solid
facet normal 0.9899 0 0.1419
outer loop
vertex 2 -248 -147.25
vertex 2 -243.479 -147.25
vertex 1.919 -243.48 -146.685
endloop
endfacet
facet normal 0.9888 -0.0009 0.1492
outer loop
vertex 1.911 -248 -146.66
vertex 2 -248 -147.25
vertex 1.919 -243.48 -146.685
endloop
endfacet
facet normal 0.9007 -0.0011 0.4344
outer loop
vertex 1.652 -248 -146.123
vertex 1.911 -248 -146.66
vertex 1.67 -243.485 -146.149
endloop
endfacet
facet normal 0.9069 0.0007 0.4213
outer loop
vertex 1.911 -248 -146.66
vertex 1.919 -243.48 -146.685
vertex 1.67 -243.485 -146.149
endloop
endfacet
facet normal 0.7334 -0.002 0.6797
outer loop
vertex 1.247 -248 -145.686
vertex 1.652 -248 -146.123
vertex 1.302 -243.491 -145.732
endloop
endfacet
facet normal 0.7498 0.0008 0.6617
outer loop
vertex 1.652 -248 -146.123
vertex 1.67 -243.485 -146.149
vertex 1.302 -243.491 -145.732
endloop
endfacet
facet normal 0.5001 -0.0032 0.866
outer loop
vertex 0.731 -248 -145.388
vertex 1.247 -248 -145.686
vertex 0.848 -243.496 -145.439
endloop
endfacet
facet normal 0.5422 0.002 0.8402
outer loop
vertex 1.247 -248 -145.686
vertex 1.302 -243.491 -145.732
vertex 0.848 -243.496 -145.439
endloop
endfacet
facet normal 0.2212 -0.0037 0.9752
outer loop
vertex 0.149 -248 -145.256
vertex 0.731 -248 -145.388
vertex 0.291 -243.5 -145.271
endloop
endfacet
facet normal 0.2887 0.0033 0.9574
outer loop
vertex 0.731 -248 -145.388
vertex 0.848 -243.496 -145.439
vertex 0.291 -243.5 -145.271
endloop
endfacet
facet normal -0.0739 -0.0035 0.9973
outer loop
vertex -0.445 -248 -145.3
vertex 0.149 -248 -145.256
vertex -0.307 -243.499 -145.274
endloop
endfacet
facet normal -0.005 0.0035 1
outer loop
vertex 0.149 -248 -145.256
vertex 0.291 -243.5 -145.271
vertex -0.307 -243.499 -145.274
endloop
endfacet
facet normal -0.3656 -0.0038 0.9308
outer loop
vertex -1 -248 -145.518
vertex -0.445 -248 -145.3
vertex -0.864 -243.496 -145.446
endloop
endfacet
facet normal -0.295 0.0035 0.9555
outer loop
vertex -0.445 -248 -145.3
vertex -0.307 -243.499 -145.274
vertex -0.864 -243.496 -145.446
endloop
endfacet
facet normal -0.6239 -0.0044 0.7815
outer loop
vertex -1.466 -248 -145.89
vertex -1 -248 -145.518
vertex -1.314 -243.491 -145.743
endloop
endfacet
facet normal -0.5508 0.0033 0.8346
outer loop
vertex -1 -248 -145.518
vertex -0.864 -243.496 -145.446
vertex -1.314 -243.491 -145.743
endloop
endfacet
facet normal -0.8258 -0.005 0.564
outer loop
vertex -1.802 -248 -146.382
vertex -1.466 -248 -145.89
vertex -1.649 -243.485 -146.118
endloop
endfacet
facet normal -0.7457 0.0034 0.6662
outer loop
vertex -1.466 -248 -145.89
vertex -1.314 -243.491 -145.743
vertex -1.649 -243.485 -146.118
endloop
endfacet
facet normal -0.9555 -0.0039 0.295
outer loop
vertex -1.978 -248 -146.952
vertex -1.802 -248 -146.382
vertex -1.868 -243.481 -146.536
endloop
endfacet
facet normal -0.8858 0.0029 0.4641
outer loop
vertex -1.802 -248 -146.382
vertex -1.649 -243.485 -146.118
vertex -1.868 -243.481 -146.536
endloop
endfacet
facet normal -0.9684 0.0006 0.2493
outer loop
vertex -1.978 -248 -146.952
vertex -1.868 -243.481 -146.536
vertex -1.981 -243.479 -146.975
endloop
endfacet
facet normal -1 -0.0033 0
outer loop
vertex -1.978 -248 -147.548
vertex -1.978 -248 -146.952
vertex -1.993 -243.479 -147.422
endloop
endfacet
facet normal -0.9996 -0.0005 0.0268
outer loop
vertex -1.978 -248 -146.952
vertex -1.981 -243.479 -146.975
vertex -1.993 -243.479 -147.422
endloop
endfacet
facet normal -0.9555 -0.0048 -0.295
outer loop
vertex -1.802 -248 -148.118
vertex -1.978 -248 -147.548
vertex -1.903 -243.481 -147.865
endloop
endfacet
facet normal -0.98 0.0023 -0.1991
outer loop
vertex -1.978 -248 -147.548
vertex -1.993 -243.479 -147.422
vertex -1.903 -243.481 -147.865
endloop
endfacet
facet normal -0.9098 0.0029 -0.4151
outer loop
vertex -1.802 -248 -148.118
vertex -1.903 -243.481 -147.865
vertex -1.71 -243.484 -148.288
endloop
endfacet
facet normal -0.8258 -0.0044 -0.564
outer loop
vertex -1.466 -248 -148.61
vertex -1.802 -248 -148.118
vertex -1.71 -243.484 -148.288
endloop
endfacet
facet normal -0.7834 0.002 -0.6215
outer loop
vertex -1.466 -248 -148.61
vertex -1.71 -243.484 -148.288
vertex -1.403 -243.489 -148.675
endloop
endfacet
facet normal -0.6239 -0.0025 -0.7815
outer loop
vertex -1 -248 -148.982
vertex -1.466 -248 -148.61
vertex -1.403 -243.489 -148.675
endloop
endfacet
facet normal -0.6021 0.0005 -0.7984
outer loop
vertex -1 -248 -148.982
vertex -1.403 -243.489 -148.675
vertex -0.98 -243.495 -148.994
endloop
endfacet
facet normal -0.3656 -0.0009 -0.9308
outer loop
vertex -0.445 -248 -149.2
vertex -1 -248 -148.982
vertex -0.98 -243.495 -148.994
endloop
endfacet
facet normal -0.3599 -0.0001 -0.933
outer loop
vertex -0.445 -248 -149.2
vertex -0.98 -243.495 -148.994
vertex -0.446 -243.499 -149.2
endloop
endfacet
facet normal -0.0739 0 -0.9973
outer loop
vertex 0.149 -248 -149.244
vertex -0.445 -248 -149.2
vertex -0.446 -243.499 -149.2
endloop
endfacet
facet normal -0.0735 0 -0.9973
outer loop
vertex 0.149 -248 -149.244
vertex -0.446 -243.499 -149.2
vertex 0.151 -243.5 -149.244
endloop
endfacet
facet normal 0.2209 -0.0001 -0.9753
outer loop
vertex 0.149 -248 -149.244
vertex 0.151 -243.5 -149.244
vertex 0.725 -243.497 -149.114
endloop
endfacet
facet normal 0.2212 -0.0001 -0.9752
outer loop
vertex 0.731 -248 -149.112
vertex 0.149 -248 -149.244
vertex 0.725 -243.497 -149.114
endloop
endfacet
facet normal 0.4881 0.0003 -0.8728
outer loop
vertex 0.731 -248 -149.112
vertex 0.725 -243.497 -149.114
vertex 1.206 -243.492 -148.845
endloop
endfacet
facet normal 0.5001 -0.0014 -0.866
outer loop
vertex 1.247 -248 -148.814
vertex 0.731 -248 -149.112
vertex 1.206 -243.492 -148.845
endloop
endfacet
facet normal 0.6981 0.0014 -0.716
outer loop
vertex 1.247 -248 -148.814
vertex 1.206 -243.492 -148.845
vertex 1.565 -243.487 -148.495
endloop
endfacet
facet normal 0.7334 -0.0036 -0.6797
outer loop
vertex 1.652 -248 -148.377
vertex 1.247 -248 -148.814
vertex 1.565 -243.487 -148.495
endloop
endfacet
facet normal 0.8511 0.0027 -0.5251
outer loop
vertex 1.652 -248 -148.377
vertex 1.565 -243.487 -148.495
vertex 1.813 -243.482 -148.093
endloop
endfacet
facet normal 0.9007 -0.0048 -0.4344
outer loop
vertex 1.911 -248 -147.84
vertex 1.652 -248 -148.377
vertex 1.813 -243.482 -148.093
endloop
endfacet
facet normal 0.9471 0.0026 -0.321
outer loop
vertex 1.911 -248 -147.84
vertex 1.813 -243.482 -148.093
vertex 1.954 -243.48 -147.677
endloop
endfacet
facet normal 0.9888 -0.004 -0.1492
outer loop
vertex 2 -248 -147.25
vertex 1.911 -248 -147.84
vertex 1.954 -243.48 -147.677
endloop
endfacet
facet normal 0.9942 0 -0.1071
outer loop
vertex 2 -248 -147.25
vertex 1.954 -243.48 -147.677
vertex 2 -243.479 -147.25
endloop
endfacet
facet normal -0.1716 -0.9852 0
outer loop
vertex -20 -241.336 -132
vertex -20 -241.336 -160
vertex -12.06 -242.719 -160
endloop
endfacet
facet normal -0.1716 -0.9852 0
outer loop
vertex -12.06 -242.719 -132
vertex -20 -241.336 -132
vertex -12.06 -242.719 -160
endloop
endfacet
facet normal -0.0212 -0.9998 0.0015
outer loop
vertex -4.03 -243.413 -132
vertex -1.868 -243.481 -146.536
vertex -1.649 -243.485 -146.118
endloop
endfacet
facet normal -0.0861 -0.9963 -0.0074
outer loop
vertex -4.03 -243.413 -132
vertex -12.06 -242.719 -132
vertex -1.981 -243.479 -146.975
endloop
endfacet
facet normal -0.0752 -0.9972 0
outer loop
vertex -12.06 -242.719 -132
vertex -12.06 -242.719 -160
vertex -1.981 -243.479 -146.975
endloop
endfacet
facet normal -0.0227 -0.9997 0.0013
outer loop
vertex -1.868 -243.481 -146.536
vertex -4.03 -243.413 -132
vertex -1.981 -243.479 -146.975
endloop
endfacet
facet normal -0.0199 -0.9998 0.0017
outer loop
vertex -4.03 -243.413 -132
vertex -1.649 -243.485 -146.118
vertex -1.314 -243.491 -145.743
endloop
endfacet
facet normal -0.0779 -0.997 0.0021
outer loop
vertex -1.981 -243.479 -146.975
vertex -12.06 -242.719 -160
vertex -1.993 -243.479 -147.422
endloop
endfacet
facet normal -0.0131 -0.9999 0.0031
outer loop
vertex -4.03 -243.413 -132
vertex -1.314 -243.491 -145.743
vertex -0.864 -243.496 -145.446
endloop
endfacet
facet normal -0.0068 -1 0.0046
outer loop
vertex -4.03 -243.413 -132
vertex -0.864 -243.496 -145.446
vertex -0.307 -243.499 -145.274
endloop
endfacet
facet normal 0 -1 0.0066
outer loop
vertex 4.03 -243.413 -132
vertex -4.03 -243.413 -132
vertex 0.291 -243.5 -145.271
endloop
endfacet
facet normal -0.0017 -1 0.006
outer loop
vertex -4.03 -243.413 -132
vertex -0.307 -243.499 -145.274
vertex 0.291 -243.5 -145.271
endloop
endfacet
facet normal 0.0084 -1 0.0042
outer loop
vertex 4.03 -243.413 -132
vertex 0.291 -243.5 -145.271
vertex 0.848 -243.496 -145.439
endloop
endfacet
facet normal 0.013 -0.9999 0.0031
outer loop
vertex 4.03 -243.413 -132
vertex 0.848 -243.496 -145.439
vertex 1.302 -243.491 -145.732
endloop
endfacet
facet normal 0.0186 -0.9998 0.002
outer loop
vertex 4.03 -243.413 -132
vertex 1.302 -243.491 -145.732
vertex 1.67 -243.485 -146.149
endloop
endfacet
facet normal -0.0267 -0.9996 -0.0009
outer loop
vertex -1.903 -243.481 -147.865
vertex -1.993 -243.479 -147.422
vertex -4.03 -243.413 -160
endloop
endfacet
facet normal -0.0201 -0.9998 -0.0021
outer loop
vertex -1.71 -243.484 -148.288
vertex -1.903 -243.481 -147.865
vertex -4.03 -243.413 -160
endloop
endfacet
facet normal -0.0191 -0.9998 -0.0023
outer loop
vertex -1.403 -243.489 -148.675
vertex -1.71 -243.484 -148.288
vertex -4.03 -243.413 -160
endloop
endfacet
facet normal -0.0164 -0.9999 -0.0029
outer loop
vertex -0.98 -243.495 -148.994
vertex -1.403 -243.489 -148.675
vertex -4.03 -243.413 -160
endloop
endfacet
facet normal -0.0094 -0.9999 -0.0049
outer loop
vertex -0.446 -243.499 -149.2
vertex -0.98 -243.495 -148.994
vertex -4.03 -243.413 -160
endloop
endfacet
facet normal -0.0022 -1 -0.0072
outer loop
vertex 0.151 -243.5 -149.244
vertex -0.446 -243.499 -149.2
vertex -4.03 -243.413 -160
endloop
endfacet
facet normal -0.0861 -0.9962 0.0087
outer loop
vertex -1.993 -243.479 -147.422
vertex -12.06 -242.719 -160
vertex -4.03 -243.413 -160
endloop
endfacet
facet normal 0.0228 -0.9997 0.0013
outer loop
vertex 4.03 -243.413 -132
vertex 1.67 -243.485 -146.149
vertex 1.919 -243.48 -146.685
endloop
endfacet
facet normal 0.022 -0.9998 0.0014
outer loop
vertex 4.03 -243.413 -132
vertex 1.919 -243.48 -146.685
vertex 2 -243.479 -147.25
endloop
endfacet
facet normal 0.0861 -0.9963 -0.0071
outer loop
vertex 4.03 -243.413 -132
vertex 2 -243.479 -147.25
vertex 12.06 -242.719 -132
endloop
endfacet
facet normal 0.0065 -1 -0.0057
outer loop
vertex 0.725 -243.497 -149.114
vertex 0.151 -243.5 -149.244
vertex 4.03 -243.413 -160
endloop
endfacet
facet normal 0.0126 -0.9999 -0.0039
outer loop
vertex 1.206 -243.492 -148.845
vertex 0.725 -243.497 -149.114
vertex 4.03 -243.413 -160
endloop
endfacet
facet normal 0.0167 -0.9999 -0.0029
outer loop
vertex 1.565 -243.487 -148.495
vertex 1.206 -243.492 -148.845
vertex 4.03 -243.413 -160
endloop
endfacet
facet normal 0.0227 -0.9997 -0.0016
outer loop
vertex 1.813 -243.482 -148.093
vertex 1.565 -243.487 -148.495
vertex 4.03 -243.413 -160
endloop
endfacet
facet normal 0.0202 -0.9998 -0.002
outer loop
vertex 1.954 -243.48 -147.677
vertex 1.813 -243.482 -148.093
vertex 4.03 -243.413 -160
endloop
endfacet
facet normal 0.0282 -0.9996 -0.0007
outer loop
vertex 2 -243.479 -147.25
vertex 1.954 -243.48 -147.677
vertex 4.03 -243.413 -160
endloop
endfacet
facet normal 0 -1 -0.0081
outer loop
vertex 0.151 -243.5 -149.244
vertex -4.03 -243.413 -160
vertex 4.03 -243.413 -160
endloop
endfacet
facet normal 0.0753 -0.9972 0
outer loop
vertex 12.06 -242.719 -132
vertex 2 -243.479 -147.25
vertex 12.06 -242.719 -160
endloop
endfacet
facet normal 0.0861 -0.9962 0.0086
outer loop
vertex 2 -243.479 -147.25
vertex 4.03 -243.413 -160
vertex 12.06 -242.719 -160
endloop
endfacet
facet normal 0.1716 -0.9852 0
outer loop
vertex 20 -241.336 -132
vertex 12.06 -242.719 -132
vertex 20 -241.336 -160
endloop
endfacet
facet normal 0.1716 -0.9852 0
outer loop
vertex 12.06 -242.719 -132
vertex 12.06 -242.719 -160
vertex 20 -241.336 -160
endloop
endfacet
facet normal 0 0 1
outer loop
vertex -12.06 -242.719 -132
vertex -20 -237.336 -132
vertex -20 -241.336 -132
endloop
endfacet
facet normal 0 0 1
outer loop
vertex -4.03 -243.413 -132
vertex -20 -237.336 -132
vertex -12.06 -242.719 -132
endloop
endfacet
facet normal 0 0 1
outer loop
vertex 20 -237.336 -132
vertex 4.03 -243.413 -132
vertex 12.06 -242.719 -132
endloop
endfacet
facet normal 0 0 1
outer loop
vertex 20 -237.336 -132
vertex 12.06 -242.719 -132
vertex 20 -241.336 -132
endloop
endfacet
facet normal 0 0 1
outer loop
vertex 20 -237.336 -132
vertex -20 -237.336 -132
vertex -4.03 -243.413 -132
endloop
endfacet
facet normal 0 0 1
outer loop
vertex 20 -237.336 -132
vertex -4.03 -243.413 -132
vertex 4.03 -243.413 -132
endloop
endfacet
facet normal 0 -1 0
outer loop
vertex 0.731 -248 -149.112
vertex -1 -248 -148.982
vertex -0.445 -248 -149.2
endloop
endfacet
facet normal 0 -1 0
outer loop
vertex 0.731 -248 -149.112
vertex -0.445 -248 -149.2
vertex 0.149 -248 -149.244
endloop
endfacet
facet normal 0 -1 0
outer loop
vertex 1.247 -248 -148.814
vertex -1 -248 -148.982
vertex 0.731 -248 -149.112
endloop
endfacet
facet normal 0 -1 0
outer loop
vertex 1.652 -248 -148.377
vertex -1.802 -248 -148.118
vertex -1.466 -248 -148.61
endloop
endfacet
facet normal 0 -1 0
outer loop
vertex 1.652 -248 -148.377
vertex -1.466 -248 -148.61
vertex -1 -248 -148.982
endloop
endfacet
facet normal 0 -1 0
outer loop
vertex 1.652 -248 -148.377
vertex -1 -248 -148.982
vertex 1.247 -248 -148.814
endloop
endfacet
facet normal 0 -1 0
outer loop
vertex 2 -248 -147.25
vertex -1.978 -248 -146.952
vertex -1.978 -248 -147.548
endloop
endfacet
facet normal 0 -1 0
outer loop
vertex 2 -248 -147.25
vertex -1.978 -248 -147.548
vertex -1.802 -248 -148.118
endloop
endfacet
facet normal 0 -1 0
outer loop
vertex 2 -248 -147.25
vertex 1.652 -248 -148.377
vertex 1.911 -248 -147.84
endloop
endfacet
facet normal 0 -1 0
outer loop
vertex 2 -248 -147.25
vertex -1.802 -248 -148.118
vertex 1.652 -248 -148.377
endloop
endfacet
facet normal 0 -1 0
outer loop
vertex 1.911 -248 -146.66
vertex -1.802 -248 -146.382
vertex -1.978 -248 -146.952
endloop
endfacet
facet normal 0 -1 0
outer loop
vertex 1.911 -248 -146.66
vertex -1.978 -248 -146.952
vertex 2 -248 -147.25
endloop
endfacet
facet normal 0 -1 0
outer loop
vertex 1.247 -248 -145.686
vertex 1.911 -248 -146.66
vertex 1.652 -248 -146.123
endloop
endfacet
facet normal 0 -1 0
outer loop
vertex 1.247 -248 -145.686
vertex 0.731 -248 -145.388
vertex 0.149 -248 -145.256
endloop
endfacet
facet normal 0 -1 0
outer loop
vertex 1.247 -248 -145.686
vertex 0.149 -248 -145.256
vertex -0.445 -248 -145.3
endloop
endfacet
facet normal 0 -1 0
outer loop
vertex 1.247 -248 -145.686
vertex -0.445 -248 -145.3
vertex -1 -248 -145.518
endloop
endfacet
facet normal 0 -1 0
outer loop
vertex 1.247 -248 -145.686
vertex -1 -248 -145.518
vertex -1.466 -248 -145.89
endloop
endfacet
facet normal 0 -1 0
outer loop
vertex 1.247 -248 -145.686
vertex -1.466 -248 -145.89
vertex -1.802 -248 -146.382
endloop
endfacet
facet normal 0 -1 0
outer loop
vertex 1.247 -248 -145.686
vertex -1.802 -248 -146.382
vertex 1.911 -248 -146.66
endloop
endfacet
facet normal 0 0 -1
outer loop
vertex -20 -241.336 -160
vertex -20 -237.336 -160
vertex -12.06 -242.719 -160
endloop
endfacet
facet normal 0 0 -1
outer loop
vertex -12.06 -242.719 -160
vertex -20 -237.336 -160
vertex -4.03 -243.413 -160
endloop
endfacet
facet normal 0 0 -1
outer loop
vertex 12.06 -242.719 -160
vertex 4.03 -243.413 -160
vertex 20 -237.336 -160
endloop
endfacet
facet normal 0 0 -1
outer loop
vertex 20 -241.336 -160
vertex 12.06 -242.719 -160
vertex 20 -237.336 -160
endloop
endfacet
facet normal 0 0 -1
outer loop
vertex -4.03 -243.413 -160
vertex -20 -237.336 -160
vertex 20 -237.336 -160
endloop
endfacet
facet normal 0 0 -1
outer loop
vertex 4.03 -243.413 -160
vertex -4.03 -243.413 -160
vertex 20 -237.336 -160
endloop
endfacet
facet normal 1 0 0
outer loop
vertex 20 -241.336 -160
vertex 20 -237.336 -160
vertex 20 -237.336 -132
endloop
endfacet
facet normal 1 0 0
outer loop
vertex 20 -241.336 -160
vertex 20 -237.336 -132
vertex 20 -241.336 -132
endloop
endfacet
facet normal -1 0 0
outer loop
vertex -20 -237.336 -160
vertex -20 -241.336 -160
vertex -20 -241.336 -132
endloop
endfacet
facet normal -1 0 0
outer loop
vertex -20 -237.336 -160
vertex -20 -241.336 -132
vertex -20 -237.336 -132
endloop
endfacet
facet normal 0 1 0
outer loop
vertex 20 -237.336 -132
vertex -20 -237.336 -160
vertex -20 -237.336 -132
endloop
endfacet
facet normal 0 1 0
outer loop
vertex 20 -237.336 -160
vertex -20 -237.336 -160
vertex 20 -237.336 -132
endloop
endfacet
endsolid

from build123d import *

# Parameters (mm, degrees)
CYLINDER157_R     = 2
CYLINDER157_DEPTH = 10
EXTRUDE038_DEPTH  = 28


with BuildPart() as cylinder157:
    # Cylinder157 → Cylinder157 (new body)
    with BuildSketch(Plane(origin=(0, -238, -147.25), x_dir=(1, 0, 0), z_dir=(0, -1, 0))):
        Circle(CYLINDER157_R)
    extrude(amount=CYLINDER157_DEPTH)


with BuildPart() as logoattach001:
    # Sketch056 → Extrude038 (new body)
    with BuildSketch(Plane.XY):
        with BuildLine():
            ThreePointArc((-20, -241.335918), (0, -243.5), (20, -241.335918))
            Line((20, -237.335918), (20, -241.335918))
            Line((-20, -237.335918), (20, -237.335918))
            Line((-20, -241.335918), (-20, -237.335918))
        make_face()
    extrude(amount=EXTRUDE038_DEPTH)


with BuildPart() as logoattach001_1:
    # Extrude038 placement: moved
    add(logoattach001.part.moved(Location((0, 0, -160))))

    # Fusion105: union Cylinder157
    add(cylinder157.part)


solid = logoattach001_1.part
